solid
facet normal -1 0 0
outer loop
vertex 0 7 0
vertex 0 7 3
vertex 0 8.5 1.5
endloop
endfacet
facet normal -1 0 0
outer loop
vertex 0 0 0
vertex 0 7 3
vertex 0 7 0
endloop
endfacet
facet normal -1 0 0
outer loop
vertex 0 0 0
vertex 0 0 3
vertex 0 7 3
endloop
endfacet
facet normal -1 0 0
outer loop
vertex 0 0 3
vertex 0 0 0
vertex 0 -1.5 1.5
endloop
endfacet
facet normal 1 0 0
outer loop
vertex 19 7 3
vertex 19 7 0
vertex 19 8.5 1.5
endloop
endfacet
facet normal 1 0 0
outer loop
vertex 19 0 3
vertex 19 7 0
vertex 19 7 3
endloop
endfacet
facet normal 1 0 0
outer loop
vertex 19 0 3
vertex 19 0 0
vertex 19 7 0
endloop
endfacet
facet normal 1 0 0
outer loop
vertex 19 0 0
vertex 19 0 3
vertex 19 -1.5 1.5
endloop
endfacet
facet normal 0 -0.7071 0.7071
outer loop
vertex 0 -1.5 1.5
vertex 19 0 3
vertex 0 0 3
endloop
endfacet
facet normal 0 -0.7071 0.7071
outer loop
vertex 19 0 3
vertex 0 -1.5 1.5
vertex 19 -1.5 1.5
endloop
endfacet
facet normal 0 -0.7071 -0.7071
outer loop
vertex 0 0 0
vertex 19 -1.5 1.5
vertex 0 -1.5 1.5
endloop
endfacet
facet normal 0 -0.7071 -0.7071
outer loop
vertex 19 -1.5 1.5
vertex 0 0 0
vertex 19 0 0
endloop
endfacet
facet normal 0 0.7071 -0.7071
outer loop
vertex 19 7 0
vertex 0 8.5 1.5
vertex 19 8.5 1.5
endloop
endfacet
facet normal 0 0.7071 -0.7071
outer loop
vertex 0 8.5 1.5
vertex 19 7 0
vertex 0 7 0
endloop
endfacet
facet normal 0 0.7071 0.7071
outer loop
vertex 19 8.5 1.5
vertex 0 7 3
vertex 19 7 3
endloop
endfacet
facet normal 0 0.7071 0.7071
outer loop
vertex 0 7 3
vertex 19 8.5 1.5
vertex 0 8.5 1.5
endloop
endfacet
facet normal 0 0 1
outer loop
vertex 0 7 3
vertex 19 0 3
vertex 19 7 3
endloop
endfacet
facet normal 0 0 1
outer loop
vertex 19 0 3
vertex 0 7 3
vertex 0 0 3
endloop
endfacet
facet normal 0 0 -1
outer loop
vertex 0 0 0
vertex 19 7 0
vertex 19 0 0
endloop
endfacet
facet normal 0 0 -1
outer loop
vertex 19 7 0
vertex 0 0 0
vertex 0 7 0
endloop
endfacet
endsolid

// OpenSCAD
c=3;
a = sqrt(c*c/2);
dim_y = 10;
dim_x = 19;
for(y=[0,dim_y-c]) {
    translate([0,y,0]) {
        rotate([45,0,0]){
            cube([dim_x,a,a]);
        }
    }
}
cube([dim_x,dim_y-c,c]);
